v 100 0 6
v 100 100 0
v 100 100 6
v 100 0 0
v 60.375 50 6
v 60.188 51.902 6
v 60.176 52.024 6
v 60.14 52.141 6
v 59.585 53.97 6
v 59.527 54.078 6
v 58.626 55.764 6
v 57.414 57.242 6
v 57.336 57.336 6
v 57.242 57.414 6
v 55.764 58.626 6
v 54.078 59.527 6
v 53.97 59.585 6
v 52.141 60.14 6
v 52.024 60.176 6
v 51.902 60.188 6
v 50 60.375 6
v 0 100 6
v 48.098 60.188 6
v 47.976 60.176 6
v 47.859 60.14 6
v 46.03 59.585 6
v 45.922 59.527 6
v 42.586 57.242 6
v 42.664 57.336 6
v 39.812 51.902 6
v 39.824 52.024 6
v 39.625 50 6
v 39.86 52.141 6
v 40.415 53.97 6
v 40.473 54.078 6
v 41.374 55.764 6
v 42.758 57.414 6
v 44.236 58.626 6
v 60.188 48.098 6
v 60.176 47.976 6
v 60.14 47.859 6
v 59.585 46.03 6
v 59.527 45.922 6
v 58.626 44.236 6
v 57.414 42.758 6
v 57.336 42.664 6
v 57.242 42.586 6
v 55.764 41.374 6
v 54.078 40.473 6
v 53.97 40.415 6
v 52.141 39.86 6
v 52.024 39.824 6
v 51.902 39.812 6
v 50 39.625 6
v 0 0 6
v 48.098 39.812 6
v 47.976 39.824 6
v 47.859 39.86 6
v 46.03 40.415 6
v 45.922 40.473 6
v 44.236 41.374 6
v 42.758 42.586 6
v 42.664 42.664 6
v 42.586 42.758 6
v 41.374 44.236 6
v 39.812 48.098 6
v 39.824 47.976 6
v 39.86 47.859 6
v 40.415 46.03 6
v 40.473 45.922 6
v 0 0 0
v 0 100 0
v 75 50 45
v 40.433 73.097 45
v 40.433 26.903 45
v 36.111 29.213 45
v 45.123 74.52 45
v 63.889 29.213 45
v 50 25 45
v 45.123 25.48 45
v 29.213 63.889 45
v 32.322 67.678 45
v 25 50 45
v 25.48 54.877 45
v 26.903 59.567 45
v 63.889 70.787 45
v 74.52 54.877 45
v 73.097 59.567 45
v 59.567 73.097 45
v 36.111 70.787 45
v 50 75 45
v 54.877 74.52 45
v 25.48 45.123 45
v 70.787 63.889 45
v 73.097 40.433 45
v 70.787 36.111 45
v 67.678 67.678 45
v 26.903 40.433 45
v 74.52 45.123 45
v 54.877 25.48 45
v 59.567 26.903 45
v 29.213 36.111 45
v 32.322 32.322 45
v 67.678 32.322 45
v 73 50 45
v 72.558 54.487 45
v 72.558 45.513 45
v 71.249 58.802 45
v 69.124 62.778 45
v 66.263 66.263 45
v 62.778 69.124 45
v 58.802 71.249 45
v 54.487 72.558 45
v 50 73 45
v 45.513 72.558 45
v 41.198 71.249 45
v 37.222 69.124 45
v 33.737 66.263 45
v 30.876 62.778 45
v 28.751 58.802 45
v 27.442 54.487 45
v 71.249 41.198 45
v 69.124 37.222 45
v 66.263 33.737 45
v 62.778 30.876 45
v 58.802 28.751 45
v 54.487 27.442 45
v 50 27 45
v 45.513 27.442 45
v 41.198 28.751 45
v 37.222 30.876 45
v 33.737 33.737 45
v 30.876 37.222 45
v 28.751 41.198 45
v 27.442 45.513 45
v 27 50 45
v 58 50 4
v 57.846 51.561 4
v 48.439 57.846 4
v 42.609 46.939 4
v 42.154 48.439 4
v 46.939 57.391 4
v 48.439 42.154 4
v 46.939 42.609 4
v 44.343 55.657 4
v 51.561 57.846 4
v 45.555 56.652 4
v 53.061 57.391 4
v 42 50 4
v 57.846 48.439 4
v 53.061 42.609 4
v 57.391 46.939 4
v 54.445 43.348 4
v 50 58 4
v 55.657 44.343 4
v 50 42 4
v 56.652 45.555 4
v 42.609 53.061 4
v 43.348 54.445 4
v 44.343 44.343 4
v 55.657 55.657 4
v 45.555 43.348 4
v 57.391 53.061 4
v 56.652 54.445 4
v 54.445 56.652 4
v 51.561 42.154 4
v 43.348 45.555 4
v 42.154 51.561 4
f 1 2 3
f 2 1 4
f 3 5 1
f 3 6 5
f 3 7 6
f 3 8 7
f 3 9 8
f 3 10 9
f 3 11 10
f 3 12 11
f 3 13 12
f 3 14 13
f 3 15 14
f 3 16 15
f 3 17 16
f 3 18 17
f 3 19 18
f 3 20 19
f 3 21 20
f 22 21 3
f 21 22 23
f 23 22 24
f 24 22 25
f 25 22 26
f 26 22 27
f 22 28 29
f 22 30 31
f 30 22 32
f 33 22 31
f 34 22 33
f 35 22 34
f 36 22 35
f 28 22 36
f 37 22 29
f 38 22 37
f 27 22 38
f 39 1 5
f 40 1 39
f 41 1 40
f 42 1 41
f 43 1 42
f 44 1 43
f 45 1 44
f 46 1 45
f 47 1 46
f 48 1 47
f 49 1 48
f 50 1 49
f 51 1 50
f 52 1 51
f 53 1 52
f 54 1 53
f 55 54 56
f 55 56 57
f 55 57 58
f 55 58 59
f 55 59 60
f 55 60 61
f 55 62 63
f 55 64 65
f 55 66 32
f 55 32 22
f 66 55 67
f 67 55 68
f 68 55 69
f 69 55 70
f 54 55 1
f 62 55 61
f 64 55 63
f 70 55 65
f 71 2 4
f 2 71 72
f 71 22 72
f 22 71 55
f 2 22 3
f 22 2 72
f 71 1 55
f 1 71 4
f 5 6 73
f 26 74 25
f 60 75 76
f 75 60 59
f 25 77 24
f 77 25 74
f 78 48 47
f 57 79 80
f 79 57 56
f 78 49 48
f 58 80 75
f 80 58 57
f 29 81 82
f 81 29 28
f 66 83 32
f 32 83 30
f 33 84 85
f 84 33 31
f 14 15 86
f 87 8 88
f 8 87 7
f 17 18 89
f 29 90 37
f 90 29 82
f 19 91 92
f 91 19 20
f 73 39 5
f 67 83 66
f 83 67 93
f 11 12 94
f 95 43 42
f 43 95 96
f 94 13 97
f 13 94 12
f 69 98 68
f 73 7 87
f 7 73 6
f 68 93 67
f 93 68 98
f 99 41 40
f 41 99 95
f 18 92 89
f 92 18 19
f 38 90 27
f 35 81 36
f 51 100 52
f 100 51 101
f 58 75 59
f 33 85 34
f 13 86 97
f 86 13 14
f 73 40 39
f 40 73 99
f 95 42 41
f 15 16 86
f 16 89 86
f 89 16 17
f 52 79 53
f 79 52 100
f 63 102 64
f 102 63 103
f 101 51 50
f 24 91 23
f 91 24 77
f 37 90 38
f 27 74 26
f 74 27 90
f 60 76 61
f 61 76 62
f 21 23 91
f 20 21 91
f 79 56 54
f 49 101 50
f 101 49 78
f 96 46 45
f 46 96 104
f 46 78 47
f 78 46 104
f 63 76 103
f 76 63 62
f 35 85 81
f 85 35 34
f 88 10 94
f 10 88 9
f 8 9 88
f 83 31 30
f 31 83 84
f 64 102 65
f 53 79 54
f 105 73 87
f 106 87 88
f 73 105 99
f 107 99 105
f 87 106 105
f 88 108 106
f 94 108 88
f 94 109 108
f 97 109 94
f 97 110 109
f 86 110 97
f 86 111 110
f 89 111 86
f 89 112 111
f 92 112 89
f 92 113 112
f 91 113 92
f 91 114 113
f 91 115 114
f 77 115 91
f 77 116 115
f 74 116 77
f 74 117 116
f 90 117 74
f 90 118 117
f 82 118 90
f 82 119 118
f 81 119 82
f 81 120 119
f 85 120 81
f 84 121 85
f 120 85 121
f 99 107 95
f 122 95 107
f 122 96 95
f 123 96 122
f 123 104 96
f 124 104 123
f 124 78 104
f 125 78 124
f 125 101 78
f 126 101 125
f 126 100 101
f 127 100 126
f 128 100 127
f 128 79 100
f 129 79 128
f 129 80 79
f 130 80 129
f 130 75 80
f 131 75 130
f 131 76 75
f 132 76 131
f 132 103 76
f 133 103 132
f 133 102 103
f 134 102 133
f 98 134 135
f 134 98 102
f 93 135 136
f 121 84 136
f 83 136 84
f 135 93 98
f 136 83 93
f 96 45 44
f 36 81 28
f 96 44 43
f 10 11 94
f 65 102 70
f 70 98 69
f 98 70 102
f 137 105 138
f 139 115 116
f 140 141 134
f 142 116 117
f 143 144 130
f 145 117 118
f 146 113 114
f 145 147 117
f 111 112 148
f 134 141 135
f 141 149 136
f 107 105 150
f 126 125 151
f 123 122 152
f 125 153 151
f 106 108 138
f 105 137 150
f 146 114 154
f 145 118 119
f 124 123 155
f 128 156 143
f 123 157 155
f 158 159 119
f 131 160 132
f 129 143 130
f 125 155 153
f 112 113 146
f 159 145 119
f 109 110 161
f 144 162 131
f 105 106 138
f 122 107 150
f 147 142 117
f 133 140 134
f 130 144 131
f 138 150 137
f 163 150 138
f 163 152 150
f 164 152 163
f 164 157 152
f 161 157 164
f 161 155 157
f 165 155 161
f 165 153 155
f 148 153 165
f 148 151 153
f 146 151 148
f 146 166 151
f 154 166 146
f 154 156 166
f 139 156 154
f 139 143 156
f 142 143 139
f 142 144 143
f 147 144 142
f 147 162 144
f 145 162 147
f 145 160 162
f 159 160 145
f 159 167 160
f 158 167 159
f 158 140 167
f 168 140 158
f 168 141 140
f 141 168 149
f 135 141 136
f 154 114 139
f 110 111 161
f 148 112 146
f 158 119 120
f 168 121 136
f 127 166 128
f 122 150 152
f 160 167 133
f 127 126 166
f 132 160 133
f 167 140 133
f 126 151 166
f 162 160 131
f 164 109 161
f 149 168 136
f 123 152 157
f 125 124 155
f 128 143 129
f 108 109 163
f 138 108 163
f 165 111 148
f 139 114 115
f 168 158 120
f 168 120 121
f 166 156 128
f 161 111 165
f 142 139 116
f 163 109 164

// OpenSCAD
$fn = 32;

// ----------------------------------------------------------------------
// Hopper: funnel with square flange
// ----------------------------------------------------------------------

// --- parameters (mm) ---
fl = 100;                 // flange side, X and Y
fl_t = 6;                 // flange thickness
cone_h = 40;              // cone height above the flange
top_d = 50;               // cone mouth diameter
bot_d = 20;               // cone spout diameter
wall = 2;                 // cone wall thickness

bore_d = bot_d - 2 * wall;  // spout bore diameter
total_h = fl_t + cone_h - 1;  // overall height

difference() {
  union() {
    cube([fl, fl, fl_t]);
    translate([fl / 2, fl / 2, fl_t - 1])
      cylinder(h = cone_h, d1 = bot_d, d2 = top_d);
  }
  translate([fl / 2, fl / 2, fl_t - 2])
    cylinder(h = cone_h + 1, d1 = bore_d, d2 = top_d - 2 * wall);
}
